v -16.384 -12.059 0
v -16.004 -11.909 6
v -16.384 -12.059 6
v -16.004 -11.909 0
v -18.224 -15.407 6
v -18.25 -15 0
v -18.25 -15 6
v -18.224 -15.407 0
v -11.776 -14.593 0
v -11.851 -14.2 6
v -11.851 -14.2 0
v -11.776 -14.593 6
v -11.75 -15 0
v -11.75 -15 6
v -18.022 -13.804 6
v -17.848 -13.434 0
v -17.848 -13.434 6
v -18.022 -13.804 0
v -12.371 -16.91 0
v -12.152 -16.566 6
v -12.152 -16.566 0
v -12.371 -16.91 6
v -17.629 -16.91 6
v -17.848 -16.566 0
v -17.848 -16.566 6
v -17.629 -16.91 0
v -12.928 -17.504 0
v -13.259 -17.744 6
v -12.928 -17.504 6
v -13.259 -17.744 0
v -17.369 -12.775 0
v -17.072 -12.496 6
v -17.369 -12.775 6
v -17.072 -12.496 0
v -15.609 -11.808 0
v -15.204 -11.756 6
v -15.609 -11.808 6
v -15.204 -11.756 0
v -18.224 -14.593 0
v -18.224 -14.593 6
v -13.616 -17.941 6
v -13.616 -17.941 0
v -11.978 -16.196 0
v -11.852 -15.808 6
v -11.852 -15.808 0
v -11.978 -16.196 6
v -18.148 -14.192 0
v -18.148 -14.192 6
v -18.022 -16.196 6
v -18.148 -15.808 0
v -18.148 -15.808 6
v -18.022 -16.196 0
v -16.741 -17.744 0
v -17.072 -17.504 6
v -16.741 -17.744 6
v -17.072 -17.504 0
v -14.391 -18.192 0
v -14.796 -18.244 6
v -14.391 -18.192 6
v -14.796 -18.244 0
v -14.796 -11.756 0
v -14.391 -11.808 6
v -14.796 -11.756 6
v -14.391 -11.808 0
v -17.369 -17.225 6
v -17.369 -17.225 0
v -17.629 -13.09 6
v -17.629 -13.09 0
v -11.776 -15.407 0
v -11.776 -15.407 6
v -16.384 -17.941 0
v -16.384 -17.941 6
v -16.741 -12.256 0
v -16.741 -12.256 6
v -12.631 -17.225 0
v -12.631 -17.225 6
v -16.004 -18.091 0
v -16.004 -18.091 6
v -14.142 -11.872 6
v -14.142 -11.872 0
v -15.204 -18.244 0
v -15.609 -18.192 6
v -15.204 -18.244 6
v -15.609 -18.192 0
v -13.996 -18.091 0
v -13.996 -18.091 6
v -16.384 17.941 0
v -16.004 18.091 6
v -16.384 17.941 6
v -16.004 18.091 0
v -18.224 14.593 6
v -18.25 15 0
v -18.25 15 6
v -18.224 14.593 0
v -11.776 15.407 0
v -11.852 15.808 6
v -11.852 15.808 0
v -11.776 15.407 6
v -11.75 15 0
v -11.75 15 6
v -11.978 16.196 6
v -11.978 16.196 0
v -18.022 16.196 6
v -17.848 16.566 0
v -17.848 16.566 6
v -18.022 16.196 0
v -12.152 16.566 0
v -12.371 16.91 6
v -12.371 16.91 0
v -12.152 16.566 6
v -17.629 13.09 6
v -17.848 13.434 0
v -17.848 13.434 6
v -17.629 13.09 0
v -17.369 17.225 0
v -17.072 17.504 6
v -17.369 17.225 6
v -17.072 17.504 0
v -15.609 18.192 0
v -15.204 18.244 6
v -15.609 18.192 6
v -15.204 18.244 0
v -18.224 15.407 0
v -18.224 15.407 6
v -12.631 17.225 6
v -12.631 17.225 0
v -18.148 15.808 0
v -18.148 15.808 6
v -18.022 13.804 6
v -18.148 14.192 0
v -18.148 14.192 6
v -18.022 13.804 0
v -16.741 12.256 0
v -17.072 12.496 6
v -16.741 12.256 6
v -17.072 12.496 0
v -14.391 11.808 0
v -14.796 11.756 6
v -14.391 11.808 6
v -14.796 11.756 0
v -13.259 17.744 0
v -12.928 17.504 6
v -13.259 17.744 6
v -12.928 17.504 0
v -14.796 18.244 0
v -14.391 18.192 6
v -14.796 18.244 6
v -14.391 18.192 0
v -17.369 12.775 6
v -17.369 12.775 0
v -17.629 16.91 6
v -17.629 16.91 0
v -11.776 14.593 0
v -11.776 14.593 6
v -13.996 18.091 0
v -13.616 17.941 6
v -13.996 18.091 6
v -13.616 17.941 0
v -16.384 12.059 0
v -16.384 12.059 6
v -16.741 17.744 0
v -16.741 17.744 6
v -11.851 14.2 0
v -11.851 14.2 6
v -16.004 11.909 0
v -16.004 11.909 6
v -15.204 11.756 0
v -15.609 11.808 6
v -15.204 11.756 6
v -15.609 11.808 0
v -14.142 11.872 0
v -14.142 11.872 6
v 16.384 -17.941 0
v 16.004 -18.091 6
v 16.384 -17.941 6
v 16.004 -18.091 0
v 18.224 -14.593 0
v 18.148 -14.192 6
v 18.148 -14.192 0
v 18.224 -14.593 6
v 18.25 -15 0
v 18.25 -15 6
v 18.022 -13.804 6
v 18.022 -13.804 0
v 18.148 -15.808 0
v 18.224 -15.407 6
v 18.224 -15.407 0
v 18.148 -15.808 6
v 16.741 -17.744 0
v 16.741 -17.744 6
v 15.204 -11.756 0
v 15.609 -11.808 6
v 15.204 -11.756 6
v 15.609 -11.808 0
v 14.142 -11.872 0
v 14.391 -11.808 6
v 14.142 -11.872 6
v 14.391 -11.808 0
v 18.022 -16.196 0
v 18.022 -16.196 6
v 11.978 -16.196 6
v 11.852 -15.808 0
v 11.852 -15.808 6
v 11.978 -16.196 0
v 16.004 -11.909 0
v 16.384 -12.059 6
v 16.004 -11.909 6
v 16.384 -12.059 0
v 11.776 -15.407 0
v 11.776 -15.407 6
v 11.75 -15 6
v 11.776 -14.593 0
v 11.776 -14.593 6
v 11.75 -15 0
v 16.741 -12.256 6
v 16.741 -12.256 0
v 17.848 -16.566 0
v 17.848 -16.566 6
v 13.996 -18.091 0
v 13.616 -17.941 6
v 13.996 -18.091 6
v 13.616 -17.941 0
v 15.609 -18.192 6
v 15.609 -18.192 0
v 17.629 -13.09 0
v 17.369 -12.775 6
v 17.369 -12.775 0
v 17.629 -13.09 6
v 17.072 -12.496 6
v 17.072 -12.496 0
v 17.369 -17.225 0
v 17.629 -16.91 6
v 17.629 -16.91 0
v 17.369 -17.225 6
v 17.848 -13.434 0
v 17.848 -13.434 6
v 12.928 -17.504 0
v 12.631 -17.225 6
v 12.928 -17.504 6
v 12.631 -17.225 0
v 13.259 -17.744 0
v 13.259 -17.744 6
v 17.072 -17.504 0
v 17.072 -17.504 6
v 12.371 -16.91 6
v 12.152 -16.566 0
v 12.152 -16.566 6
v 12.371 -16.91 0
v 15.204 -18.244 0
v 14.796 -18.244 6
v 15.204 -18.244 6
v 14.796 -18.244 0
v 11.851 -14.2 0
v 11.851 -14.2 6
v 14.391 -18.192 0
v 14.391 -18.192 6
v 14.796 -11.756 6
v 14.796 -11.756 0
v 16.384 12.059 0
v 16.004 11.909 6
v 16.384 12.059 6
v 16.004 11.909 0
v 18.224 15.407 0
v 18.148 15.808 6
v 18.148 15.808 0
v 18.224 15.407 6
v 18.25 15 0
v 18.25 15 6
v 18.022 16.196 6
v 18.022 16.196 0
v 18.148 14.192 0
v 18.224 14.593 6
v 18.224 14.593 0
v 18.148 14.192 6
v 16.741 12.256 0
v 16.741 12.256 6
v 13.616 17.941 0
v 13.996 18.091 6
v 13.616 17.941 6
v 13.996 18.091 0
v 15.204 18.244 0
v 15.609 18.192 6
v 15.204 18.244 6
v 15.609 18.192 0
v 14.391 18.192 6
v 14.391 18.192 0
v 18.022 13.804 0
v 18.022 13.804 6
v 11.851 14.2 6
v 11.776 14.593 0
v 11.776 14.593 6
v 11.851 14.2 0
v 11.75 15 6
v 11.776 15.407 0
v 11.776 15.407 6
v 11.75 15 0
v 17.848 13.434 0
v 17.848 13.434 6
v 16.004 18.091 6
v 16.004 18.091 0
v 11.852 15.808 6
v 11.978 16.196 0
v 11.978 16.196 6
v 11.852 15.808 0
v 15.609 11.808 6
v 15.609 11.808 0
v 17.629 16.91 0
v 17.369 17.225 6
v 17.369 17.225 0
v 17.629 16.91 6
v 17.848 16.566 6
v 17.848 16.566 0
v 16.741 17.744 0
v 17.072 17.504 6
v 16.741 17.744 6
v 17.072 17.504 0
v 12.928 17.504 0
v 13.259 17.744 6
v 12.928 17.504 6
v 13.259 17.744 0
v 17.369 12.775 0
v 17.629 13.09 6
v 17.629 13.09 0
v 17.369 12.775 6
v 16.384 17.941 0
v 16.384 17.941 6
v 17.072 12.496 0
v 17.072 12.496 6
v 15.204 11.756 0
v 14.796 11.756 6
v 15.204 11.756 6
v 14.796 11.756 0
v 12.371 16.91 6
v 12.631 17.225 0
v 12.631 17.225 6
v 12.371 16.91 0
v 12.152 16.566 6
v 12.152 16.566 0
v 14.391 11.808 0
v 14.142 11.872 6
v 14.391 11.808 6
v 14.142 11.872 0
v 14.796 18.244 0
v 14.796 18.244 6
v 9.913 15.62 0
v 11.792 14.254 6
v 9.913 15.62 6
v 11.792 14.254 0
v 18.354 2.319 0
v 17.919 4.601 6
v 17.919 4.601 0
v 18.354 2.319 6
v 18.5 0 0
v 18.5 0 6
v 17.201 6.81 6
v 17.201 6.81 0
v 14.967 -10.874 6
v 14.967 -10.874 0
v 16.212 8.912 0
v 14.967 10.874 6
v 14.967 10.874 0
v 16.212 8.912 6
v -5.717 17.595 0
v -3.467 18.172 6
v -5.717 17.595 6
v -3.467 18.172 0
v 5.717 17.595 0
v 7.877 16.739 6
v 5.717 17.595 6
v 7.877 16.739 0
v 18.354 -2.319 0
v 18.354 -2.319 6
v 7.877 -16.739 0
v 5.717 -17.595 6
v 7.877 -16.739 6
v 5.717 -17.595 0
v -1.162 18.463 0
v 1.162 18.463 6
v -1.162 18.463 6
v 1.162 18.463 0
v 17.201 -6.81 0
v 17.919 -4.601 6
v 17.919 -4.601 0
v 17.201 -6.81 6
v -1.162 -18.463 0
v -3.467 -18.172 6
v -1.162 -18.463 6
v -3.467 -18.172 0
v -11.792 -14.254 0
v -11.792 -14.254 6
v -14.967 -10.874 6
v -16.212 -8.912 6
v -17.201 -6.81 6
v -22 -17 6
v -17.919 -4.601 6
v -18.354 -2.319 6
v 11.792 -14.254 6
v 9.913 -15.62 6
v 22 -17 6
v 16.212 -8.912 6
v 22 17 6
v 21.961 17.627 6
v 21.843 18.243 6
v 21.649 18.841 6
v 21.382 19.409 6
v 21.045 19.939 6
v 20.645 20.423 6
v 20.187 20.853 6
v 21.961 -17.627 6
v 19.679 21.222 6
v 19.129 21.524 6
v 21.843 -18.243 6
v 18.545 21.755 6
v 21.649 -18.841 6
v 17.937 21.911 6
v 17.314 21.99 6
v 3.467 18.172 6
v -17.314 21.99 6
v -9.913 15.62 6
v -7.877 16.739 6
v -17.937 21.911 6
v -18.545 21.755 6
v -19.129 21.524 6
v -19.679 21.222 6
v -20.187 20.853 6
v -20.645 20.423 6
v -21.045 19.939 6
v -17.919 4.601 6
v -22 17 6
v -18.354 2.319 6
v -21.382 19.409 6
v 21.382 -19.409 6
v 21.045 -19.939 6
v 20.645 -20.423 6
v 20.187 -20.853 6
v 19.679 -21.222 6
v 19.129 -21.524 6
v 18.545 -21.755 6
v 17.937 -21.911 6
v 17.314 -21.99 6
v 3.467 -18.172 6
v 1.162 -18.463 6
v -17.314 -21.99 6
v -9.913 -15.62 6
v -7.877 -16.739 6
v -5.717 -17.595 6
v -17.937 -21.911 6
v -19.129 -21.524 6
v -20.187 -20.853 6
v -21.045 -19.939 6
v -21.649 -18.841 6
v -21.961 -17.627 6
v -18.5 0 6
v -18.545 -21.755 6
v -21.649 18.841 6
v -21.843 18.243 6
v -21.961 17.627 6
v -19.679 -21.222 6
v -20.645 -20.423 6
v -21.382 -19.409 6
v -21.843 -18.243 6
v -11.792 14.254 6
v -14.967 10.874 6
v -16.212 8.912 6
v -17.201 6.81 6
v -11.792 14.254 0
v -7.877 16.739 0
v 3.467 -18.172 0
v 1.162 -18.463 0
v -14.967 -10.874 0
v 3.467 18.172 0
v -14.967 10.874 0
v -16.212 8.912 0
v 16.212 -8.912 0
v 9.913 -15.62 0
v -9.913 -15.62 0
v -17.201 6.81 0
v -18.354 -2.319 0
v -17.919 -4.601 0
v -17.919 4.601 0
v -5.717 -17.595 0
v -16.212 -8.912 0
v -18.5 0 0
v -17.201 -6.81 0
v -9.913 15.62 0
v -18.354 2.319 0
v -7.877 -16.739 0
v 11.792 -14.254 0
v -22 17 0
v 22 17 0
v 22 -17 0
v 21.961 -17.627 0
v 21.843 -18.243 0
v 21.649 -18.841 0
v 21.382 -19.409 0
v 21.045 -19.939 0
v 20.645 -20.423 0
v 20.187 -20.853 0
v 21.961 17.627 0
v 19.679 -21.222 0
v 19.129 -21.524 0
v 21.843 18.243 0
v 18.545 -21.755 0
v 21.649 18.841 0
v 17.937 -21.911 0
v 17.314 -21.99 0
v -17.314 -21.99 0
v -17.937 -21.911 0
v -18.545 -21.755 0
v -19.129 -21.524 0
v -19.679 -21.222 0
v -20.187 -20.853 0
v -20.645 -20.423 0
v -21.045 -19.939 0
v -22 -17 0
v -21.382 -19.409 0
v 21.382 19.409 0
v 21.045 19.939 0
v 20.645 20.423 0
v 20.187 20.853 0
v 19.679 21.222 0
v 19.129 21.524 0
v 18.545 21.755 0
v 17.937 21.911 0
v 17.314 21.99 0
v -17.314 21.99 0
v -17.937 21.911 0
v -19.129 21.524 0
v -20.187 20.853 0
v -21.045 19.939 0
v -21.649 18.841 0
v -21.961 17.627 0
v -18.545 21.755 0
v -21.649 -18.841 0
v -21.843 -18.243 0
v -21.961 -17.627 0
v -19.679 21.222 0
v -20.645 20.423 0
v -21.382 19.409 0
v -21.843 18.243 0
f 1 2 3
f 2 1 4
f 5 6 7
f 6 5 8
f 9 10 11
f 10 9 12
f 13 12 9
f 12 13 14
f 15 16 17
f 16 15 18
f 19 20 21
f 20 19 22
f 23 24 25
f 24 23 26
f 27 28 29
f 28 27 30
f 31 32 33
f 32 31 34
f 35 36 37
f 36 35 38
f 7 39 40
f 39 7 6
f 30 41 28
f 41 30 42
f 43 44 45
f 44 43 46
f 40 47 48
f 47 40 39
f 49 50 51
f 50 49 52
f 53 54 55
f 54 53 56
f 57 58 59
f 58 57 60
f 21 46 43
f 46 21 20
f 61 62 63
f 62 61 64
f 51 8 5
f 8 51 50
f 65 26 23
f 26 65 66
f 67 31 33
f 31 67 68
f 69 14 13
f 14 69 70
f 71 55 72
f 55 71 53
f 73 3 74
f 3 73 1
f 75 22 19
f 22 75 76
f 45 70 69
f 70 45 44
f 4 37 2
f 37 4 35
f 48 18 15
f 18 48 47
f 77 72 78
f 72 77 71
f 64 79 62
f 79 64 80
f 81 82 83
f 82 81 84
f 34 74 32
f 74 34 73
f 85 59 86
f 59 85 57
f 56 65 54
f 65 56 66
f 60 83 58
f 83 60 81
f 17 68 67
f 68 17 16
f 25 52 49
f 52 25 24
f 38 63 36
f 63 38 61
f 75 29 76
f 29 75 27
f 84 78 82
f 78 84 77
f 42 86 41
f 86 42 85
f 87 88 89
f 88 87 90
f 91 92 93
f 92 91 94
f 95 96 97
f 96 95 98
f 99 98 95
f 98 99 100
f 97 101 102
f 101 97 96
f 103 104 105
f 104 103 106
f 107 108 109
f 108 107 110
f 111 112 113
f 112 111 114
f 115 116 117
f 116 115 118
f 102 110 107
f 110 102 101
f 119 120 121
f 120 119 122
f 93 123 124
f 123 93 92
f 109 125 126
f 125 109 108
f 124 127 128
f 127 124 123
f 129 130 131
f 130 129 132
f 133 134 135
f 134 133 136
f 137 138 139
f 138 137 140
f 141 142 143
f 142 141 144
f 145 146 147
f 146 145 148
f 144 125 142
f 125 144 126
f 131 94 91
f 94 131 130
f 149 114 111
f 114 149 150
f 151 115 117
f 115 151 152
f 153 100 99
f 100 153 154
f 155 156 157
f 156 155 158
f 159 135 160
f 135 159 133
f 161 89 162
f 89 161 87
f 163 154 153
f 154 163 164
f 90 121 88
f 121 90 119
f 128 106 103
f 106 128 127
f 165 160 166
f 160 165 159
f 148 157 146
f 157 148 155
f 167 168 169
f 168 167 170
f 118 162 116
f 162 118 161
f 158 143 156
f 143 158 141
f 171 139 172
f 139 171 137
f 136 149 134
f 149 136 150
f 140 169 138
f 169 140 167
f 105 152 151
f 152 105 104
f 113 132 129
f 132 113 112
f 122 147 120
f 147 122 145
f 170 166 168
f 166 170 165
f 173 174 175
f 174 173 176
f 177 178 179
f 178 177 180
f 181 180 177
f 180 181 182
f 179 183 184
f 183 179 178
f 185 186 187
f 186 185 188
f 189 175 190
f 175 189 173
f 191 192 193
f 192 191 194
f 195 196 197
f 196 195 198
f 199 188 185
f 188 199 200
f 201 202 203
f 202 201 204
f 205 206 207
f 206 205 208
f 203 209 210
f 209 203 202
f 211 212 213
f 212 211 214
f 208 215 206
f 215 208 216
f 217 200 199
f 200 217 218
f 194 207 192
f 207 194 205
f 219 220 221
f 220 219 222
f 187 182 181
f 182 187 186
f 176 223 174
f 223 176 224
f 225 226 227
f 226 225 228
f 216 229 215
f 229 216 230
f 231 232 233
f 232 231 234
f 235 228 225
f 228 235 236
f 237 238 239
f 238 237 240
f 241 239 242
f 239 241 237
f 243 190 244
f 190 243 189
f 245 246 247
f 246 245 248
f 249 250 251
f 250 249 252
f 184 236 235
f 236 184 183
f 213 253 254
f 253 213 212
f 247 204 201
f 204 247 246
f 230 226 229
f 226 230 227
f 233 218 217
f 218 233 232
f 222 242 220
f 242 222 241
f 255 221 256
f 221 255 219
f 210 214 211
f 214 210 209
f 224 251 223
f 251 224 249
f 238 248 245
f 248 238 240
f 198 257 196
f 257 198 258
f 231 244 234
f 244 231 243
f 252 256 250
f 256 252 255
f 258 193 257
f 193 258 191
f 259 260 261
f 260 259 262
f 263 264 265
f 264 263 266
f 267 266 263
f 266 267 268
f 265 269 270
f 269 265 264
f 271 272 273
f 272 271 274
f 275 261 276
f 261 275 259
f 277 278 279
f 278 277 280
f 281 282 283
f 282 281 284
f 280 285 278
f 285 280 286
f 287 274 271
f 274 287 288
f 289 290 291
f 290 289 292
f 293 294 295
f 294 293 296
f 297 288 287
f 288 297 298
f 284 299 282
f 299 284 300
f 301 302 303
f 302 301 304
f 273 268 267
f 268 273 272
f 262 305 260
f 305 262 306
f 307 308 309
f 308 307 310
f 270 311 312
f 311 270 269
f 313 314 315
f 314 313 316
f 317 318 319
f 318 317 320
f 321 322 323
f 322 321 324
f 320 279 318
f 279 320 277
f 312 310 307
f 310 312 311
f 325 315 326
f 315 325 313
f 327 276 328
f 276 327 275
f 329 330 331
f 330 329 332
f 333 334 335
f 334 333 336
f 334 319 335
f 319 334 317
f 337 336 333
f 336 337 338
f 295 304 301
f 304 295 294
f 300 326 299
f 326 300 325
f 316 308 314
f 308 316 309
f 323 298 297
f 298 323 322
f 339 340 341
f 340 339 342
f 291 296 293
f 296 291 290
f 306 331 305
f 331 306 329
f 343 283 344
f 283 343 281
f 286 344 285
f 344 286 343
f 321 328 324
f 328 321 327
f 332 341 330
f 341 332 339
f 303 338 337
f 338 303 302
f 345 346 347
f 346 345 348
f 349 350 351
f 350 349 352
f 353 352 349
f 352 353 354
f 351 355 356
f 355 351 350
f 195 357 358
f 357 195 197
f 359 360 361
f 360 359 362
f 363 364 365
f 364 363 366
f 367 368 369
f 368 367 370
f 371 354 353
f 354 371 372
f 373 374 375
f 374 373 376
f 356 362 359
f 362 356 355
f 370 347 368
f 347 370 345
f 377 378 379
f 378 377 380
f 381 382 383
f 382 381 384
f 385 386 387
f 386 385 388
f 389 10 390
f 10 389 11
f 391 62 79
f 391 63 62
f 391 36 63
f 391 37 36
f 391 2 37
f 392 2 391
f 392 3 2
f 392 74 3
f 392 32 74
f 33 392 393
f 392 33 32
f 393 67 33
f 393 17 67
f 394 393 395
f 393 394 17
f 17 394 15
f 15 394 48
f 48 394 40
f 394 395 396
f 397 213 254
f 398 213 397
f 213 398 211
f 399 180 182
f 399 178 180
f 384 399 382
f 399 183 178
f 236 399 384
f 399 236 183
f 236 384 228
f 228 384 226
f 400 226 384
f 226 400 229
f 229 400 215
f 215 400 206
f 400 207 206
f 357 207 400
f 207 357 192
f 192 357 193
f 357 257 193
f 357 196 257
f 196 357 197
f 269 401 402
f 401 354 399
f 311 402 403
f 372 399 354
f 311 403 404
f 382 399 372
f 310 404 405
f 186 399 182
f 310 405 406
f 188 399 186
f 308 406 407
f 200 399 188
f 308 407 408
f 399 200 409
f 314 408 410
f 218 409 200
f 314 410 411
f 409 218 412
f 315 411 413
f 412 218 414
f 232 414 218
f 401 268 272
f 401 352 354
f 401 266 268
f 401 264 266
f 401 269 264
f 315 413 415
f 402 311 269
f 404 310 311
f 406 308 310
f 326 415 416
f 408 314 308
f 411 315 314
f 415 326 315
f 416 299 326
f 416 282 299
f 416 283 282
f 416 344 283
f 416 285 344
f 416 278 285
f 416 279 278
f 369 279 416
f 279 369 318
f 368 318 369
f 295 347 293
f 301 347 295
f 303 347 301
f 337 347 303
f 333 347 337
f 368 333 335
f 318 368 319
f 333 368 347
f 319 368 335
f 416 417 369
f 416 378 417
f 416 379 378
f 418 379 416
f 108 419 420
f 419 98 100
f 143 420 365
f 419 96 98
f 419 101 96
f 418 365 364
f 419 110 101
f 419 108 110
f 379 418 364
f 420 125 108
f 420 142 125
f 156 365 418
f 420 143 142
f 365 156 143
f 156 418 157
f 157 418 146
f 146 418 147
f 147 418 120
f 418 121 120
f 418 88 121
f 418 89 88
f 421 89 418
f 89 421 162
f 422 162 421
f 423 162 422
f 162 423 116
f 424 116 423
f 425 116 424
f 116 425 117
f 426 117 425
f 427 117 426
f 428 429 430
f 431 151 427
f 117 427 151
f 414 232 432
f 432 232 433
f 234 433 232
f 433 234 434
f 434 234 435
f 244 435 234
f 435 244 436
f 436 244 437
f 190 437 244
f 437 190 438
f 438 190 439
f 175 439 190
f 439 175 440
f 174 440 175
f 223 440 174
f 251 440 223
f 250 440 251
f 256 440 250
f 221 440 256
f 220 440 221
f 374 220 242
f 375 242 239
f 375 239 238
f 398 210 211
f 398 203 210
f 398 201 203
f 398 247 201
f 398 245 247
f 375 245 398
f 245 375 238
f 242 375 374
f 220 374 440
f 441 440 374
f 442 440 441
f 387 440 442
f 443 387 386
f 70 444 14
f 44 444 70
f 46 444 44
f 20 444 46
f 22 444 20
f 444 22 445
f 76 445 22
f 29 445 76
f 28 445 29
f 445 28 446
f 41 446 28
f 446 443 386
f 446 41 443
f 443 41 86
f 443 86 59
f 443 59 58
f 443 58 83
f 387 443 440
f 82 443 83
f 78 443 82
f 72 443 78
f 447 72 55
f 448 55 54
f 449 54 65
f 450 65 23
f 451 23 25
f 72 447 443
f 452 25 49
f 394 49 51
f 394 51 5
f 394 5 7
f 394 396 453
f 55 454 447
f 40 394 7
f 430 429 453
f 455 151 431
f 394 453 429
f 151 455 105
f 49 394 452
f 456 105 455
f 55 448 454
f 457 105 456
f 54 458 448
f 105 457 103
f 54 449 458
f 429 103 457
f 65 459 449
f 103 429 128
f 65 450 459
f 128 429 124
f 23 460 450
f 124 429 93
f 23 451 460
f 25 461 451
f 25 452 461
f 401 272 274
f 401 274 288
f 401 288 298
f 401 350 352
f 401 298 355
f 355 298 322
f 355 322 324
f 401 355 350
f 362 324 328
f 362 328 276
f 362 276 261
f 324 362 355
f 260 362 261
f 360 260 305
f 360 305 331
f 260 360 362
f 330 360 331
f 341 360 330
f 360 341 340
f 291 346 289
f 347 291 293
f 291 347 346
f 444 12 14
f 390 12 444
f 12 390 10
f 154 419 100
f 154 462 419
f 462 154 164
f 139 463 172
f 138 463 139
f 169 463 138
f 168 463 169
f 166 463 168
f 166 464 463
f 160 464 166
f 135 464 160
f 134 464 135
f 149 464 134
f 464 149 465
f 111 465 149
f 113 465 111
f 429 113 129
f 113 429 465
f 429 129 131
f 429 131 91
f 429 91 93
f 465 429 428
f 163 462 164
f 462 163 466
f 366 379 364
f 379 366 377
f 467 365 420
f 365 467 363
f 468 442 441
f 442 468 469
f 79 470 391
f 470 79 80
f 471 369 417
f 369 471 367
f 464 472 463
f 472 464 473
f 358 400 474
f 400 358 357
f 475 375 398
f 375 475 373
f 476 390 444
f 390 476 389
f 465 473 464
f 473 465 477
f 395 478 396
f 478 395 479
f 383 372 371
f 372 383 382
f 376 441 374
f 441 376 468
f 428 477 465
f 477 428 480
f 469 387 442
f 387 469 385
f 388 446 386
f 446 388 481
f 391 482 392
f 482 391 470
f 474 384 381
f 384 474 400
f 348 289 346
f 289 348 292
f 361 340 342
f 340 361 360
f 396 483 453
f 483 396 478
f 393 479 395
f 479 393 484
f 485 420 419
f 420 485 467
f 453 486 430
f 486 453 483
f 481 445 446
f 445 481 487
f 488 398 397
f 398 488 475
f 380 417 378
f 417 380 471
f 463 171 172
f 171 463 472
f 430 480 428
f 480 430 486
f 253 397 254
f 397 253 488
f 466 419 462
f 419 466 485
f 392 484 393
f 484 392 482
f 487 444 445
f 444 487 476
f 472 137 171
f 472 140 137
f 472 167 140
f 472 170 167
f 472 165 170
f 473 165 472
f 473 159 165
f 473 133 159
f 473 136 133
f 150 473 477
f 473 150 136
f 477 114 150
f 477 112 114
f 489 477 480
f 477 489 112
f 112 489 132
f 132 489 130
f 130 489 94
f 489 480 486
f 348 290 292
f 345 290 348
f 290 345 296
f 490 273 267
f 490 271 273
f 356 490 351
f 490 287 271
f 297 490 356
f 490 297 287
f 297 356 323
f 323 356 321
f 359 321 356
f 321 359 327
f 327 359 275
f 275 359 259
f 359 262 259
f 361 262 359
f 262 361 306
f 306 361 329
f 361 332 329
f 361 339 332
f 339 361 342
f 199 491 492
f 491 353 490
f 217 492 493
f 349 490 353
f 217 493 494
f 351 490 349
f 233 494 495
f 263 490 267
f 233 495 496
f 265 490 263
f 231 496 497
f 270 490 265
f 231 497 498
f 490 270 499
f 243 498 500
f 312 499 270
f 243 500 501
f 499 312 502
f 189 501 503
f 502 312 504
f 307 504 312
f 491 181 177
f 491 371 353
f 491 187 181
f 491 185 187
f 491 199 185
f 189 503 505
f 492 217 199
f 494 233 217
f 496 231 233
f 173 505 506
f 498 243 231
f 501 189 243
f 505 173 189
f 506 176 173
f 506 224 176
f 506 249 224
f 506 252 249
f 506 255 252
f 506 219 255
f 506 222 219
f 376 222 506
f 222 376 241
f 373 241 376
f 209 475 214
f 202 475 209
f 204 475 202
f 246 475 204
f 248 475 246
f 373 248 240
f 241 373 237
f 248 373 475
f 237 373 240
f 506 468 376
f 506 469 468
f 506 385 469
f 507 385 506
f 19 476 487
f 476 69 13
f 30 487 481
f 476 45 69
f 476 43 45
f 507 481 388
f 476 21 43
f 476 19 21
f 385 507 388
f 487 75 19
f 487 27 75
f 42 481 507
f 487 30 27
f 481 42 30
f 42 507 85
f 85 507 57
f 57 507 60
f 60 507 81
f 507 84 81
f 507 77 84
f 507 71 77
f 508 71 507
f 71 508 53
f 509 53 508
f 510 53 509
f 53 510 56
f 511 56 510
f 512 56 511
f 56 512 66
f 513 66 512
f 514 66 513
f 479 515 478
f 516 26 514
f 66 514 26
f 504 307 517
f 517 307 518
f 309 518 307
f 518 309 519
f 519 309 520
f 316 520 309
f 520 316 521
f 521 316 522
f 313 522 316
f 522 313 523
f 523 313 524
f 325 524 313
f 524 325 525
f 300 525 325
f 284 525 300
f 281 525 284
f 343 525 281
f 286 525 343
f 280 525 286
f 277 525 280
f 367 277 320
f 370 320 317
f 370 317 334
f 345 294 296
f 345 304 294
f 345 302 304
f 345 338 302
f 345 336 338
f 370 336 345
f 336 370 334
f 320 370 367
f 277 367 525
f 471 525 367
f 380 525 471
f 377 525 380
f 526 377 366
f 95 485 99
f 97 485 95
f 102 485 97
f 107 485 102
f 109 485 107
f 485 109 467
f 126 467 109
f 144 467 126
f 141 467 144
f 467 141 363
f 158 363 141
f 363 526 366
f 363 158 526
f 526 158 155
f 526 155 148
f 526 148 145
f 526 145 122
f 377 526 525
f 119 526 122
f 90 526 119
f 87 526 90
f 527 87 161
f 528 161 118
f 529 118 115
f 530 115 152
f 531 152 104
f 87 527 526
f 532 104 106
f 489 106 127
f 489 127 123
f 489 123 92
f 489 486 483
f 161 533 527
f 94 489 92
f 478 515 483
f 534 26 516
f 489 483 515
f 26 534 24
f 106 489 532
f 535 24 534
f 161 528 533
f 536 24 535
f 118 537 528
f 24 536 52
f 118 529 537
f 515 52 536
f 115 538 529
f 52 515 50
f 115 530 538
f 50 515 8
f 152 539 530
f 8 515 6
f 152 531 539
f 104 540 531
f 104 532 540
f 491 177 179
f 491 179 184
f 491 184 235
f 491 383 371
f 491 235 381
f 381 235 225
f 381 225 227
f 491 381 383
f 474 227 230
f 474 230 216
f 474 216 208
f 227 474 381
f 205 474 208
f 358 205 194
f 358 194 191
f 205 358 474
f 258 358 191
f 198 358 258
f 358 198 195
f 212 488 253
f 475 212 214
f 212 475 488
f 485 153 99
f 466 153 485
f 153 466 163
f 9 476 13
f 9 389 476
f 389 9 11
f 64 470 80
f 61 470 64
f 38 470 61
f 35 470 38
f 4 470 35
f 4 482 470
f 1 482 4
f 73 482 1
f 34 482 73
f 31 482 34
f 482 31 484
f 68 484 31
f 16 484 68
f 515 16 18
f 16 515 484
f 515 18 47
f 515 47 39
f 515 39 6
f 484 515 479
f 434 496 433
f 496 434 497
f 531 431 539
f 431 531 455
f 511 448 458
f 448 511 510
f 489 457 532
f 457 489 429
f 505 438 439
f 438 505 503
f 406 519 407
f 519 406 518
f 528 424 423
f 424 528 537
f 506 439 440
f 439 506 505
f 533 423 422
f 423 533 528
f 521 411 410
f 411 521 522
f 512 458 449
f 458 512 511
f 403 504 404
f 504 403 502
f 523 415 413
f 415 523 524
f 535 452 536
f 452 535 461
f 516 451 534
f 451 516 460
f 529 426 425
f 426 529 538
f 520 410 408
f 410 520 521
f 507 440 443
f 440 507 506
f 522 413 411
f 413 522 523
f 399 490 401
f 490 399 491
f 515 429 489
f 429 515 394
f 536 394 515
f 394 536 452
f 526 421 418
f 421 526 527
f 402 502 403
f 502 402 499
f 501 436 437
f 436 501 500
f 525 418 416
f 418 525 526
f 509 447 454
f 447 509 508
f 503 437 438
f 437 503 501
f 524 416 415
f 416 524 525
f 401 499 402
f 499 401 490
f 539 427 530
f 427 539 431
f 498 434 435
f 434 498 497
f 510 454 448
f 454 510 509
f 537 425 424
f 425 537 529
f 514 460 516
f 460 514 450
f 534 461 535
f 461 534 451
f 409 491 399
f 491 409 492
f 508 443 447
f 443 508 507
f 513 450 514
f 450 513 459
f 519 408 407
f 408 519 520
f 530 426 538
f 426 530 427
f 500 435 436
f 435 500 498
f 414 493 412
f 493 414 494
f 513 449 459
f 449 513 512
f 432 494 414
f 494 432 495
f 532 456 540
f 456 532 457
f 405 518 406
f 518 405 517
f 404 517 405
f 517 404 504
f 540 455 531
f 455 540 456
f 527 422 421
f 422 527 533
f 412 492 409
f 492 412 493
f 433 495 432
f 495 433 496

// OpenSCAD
$fn = 50;


difference() {
	union() {
		hull() {
			translate(v = [-17.0000000000, 17.0000000000, 0]) {
				cylinder(h = 6, r = 5);
			}
			translate(v = [17.0000000000, 17.0000000000, 0]) {
				cylinder(h = 6, r = 5);
			}
			translate(v = [-17.0000000000, -17.0000000000, 0]) {
				cylinder(h = 6, r = 5);
			}
			translate(v = [17.0000000000, -17.0000000000, 0]) {
				cylinder(h = 6, r = 5);
			}
		}
	}
	union() {
		#translate(v = [-15.0000000000, -15.0000000000, -100.0000000000]) {
			cylinder(h = 200, r = 3.2500000000);
		}
		#translate(v = [-15.0000000000, 15.0000000000, -100.0000000000]) {
			cylinder(h = 200, r = 3.2500000000);
		}
		#translate(v = [15.0000000000, -15.0000000000, -100.0000000000]) {
			cylinder(h = 200, r = 3.2500000000);
		}
		#translate(v = [15.0000000000, 15.0000000000, -100.0000000000]) {
			cylinder(h = 200, r = 3.2500000000);
		}
		#cylinder(h = 6, r = 18.5000000000);
	}
}
